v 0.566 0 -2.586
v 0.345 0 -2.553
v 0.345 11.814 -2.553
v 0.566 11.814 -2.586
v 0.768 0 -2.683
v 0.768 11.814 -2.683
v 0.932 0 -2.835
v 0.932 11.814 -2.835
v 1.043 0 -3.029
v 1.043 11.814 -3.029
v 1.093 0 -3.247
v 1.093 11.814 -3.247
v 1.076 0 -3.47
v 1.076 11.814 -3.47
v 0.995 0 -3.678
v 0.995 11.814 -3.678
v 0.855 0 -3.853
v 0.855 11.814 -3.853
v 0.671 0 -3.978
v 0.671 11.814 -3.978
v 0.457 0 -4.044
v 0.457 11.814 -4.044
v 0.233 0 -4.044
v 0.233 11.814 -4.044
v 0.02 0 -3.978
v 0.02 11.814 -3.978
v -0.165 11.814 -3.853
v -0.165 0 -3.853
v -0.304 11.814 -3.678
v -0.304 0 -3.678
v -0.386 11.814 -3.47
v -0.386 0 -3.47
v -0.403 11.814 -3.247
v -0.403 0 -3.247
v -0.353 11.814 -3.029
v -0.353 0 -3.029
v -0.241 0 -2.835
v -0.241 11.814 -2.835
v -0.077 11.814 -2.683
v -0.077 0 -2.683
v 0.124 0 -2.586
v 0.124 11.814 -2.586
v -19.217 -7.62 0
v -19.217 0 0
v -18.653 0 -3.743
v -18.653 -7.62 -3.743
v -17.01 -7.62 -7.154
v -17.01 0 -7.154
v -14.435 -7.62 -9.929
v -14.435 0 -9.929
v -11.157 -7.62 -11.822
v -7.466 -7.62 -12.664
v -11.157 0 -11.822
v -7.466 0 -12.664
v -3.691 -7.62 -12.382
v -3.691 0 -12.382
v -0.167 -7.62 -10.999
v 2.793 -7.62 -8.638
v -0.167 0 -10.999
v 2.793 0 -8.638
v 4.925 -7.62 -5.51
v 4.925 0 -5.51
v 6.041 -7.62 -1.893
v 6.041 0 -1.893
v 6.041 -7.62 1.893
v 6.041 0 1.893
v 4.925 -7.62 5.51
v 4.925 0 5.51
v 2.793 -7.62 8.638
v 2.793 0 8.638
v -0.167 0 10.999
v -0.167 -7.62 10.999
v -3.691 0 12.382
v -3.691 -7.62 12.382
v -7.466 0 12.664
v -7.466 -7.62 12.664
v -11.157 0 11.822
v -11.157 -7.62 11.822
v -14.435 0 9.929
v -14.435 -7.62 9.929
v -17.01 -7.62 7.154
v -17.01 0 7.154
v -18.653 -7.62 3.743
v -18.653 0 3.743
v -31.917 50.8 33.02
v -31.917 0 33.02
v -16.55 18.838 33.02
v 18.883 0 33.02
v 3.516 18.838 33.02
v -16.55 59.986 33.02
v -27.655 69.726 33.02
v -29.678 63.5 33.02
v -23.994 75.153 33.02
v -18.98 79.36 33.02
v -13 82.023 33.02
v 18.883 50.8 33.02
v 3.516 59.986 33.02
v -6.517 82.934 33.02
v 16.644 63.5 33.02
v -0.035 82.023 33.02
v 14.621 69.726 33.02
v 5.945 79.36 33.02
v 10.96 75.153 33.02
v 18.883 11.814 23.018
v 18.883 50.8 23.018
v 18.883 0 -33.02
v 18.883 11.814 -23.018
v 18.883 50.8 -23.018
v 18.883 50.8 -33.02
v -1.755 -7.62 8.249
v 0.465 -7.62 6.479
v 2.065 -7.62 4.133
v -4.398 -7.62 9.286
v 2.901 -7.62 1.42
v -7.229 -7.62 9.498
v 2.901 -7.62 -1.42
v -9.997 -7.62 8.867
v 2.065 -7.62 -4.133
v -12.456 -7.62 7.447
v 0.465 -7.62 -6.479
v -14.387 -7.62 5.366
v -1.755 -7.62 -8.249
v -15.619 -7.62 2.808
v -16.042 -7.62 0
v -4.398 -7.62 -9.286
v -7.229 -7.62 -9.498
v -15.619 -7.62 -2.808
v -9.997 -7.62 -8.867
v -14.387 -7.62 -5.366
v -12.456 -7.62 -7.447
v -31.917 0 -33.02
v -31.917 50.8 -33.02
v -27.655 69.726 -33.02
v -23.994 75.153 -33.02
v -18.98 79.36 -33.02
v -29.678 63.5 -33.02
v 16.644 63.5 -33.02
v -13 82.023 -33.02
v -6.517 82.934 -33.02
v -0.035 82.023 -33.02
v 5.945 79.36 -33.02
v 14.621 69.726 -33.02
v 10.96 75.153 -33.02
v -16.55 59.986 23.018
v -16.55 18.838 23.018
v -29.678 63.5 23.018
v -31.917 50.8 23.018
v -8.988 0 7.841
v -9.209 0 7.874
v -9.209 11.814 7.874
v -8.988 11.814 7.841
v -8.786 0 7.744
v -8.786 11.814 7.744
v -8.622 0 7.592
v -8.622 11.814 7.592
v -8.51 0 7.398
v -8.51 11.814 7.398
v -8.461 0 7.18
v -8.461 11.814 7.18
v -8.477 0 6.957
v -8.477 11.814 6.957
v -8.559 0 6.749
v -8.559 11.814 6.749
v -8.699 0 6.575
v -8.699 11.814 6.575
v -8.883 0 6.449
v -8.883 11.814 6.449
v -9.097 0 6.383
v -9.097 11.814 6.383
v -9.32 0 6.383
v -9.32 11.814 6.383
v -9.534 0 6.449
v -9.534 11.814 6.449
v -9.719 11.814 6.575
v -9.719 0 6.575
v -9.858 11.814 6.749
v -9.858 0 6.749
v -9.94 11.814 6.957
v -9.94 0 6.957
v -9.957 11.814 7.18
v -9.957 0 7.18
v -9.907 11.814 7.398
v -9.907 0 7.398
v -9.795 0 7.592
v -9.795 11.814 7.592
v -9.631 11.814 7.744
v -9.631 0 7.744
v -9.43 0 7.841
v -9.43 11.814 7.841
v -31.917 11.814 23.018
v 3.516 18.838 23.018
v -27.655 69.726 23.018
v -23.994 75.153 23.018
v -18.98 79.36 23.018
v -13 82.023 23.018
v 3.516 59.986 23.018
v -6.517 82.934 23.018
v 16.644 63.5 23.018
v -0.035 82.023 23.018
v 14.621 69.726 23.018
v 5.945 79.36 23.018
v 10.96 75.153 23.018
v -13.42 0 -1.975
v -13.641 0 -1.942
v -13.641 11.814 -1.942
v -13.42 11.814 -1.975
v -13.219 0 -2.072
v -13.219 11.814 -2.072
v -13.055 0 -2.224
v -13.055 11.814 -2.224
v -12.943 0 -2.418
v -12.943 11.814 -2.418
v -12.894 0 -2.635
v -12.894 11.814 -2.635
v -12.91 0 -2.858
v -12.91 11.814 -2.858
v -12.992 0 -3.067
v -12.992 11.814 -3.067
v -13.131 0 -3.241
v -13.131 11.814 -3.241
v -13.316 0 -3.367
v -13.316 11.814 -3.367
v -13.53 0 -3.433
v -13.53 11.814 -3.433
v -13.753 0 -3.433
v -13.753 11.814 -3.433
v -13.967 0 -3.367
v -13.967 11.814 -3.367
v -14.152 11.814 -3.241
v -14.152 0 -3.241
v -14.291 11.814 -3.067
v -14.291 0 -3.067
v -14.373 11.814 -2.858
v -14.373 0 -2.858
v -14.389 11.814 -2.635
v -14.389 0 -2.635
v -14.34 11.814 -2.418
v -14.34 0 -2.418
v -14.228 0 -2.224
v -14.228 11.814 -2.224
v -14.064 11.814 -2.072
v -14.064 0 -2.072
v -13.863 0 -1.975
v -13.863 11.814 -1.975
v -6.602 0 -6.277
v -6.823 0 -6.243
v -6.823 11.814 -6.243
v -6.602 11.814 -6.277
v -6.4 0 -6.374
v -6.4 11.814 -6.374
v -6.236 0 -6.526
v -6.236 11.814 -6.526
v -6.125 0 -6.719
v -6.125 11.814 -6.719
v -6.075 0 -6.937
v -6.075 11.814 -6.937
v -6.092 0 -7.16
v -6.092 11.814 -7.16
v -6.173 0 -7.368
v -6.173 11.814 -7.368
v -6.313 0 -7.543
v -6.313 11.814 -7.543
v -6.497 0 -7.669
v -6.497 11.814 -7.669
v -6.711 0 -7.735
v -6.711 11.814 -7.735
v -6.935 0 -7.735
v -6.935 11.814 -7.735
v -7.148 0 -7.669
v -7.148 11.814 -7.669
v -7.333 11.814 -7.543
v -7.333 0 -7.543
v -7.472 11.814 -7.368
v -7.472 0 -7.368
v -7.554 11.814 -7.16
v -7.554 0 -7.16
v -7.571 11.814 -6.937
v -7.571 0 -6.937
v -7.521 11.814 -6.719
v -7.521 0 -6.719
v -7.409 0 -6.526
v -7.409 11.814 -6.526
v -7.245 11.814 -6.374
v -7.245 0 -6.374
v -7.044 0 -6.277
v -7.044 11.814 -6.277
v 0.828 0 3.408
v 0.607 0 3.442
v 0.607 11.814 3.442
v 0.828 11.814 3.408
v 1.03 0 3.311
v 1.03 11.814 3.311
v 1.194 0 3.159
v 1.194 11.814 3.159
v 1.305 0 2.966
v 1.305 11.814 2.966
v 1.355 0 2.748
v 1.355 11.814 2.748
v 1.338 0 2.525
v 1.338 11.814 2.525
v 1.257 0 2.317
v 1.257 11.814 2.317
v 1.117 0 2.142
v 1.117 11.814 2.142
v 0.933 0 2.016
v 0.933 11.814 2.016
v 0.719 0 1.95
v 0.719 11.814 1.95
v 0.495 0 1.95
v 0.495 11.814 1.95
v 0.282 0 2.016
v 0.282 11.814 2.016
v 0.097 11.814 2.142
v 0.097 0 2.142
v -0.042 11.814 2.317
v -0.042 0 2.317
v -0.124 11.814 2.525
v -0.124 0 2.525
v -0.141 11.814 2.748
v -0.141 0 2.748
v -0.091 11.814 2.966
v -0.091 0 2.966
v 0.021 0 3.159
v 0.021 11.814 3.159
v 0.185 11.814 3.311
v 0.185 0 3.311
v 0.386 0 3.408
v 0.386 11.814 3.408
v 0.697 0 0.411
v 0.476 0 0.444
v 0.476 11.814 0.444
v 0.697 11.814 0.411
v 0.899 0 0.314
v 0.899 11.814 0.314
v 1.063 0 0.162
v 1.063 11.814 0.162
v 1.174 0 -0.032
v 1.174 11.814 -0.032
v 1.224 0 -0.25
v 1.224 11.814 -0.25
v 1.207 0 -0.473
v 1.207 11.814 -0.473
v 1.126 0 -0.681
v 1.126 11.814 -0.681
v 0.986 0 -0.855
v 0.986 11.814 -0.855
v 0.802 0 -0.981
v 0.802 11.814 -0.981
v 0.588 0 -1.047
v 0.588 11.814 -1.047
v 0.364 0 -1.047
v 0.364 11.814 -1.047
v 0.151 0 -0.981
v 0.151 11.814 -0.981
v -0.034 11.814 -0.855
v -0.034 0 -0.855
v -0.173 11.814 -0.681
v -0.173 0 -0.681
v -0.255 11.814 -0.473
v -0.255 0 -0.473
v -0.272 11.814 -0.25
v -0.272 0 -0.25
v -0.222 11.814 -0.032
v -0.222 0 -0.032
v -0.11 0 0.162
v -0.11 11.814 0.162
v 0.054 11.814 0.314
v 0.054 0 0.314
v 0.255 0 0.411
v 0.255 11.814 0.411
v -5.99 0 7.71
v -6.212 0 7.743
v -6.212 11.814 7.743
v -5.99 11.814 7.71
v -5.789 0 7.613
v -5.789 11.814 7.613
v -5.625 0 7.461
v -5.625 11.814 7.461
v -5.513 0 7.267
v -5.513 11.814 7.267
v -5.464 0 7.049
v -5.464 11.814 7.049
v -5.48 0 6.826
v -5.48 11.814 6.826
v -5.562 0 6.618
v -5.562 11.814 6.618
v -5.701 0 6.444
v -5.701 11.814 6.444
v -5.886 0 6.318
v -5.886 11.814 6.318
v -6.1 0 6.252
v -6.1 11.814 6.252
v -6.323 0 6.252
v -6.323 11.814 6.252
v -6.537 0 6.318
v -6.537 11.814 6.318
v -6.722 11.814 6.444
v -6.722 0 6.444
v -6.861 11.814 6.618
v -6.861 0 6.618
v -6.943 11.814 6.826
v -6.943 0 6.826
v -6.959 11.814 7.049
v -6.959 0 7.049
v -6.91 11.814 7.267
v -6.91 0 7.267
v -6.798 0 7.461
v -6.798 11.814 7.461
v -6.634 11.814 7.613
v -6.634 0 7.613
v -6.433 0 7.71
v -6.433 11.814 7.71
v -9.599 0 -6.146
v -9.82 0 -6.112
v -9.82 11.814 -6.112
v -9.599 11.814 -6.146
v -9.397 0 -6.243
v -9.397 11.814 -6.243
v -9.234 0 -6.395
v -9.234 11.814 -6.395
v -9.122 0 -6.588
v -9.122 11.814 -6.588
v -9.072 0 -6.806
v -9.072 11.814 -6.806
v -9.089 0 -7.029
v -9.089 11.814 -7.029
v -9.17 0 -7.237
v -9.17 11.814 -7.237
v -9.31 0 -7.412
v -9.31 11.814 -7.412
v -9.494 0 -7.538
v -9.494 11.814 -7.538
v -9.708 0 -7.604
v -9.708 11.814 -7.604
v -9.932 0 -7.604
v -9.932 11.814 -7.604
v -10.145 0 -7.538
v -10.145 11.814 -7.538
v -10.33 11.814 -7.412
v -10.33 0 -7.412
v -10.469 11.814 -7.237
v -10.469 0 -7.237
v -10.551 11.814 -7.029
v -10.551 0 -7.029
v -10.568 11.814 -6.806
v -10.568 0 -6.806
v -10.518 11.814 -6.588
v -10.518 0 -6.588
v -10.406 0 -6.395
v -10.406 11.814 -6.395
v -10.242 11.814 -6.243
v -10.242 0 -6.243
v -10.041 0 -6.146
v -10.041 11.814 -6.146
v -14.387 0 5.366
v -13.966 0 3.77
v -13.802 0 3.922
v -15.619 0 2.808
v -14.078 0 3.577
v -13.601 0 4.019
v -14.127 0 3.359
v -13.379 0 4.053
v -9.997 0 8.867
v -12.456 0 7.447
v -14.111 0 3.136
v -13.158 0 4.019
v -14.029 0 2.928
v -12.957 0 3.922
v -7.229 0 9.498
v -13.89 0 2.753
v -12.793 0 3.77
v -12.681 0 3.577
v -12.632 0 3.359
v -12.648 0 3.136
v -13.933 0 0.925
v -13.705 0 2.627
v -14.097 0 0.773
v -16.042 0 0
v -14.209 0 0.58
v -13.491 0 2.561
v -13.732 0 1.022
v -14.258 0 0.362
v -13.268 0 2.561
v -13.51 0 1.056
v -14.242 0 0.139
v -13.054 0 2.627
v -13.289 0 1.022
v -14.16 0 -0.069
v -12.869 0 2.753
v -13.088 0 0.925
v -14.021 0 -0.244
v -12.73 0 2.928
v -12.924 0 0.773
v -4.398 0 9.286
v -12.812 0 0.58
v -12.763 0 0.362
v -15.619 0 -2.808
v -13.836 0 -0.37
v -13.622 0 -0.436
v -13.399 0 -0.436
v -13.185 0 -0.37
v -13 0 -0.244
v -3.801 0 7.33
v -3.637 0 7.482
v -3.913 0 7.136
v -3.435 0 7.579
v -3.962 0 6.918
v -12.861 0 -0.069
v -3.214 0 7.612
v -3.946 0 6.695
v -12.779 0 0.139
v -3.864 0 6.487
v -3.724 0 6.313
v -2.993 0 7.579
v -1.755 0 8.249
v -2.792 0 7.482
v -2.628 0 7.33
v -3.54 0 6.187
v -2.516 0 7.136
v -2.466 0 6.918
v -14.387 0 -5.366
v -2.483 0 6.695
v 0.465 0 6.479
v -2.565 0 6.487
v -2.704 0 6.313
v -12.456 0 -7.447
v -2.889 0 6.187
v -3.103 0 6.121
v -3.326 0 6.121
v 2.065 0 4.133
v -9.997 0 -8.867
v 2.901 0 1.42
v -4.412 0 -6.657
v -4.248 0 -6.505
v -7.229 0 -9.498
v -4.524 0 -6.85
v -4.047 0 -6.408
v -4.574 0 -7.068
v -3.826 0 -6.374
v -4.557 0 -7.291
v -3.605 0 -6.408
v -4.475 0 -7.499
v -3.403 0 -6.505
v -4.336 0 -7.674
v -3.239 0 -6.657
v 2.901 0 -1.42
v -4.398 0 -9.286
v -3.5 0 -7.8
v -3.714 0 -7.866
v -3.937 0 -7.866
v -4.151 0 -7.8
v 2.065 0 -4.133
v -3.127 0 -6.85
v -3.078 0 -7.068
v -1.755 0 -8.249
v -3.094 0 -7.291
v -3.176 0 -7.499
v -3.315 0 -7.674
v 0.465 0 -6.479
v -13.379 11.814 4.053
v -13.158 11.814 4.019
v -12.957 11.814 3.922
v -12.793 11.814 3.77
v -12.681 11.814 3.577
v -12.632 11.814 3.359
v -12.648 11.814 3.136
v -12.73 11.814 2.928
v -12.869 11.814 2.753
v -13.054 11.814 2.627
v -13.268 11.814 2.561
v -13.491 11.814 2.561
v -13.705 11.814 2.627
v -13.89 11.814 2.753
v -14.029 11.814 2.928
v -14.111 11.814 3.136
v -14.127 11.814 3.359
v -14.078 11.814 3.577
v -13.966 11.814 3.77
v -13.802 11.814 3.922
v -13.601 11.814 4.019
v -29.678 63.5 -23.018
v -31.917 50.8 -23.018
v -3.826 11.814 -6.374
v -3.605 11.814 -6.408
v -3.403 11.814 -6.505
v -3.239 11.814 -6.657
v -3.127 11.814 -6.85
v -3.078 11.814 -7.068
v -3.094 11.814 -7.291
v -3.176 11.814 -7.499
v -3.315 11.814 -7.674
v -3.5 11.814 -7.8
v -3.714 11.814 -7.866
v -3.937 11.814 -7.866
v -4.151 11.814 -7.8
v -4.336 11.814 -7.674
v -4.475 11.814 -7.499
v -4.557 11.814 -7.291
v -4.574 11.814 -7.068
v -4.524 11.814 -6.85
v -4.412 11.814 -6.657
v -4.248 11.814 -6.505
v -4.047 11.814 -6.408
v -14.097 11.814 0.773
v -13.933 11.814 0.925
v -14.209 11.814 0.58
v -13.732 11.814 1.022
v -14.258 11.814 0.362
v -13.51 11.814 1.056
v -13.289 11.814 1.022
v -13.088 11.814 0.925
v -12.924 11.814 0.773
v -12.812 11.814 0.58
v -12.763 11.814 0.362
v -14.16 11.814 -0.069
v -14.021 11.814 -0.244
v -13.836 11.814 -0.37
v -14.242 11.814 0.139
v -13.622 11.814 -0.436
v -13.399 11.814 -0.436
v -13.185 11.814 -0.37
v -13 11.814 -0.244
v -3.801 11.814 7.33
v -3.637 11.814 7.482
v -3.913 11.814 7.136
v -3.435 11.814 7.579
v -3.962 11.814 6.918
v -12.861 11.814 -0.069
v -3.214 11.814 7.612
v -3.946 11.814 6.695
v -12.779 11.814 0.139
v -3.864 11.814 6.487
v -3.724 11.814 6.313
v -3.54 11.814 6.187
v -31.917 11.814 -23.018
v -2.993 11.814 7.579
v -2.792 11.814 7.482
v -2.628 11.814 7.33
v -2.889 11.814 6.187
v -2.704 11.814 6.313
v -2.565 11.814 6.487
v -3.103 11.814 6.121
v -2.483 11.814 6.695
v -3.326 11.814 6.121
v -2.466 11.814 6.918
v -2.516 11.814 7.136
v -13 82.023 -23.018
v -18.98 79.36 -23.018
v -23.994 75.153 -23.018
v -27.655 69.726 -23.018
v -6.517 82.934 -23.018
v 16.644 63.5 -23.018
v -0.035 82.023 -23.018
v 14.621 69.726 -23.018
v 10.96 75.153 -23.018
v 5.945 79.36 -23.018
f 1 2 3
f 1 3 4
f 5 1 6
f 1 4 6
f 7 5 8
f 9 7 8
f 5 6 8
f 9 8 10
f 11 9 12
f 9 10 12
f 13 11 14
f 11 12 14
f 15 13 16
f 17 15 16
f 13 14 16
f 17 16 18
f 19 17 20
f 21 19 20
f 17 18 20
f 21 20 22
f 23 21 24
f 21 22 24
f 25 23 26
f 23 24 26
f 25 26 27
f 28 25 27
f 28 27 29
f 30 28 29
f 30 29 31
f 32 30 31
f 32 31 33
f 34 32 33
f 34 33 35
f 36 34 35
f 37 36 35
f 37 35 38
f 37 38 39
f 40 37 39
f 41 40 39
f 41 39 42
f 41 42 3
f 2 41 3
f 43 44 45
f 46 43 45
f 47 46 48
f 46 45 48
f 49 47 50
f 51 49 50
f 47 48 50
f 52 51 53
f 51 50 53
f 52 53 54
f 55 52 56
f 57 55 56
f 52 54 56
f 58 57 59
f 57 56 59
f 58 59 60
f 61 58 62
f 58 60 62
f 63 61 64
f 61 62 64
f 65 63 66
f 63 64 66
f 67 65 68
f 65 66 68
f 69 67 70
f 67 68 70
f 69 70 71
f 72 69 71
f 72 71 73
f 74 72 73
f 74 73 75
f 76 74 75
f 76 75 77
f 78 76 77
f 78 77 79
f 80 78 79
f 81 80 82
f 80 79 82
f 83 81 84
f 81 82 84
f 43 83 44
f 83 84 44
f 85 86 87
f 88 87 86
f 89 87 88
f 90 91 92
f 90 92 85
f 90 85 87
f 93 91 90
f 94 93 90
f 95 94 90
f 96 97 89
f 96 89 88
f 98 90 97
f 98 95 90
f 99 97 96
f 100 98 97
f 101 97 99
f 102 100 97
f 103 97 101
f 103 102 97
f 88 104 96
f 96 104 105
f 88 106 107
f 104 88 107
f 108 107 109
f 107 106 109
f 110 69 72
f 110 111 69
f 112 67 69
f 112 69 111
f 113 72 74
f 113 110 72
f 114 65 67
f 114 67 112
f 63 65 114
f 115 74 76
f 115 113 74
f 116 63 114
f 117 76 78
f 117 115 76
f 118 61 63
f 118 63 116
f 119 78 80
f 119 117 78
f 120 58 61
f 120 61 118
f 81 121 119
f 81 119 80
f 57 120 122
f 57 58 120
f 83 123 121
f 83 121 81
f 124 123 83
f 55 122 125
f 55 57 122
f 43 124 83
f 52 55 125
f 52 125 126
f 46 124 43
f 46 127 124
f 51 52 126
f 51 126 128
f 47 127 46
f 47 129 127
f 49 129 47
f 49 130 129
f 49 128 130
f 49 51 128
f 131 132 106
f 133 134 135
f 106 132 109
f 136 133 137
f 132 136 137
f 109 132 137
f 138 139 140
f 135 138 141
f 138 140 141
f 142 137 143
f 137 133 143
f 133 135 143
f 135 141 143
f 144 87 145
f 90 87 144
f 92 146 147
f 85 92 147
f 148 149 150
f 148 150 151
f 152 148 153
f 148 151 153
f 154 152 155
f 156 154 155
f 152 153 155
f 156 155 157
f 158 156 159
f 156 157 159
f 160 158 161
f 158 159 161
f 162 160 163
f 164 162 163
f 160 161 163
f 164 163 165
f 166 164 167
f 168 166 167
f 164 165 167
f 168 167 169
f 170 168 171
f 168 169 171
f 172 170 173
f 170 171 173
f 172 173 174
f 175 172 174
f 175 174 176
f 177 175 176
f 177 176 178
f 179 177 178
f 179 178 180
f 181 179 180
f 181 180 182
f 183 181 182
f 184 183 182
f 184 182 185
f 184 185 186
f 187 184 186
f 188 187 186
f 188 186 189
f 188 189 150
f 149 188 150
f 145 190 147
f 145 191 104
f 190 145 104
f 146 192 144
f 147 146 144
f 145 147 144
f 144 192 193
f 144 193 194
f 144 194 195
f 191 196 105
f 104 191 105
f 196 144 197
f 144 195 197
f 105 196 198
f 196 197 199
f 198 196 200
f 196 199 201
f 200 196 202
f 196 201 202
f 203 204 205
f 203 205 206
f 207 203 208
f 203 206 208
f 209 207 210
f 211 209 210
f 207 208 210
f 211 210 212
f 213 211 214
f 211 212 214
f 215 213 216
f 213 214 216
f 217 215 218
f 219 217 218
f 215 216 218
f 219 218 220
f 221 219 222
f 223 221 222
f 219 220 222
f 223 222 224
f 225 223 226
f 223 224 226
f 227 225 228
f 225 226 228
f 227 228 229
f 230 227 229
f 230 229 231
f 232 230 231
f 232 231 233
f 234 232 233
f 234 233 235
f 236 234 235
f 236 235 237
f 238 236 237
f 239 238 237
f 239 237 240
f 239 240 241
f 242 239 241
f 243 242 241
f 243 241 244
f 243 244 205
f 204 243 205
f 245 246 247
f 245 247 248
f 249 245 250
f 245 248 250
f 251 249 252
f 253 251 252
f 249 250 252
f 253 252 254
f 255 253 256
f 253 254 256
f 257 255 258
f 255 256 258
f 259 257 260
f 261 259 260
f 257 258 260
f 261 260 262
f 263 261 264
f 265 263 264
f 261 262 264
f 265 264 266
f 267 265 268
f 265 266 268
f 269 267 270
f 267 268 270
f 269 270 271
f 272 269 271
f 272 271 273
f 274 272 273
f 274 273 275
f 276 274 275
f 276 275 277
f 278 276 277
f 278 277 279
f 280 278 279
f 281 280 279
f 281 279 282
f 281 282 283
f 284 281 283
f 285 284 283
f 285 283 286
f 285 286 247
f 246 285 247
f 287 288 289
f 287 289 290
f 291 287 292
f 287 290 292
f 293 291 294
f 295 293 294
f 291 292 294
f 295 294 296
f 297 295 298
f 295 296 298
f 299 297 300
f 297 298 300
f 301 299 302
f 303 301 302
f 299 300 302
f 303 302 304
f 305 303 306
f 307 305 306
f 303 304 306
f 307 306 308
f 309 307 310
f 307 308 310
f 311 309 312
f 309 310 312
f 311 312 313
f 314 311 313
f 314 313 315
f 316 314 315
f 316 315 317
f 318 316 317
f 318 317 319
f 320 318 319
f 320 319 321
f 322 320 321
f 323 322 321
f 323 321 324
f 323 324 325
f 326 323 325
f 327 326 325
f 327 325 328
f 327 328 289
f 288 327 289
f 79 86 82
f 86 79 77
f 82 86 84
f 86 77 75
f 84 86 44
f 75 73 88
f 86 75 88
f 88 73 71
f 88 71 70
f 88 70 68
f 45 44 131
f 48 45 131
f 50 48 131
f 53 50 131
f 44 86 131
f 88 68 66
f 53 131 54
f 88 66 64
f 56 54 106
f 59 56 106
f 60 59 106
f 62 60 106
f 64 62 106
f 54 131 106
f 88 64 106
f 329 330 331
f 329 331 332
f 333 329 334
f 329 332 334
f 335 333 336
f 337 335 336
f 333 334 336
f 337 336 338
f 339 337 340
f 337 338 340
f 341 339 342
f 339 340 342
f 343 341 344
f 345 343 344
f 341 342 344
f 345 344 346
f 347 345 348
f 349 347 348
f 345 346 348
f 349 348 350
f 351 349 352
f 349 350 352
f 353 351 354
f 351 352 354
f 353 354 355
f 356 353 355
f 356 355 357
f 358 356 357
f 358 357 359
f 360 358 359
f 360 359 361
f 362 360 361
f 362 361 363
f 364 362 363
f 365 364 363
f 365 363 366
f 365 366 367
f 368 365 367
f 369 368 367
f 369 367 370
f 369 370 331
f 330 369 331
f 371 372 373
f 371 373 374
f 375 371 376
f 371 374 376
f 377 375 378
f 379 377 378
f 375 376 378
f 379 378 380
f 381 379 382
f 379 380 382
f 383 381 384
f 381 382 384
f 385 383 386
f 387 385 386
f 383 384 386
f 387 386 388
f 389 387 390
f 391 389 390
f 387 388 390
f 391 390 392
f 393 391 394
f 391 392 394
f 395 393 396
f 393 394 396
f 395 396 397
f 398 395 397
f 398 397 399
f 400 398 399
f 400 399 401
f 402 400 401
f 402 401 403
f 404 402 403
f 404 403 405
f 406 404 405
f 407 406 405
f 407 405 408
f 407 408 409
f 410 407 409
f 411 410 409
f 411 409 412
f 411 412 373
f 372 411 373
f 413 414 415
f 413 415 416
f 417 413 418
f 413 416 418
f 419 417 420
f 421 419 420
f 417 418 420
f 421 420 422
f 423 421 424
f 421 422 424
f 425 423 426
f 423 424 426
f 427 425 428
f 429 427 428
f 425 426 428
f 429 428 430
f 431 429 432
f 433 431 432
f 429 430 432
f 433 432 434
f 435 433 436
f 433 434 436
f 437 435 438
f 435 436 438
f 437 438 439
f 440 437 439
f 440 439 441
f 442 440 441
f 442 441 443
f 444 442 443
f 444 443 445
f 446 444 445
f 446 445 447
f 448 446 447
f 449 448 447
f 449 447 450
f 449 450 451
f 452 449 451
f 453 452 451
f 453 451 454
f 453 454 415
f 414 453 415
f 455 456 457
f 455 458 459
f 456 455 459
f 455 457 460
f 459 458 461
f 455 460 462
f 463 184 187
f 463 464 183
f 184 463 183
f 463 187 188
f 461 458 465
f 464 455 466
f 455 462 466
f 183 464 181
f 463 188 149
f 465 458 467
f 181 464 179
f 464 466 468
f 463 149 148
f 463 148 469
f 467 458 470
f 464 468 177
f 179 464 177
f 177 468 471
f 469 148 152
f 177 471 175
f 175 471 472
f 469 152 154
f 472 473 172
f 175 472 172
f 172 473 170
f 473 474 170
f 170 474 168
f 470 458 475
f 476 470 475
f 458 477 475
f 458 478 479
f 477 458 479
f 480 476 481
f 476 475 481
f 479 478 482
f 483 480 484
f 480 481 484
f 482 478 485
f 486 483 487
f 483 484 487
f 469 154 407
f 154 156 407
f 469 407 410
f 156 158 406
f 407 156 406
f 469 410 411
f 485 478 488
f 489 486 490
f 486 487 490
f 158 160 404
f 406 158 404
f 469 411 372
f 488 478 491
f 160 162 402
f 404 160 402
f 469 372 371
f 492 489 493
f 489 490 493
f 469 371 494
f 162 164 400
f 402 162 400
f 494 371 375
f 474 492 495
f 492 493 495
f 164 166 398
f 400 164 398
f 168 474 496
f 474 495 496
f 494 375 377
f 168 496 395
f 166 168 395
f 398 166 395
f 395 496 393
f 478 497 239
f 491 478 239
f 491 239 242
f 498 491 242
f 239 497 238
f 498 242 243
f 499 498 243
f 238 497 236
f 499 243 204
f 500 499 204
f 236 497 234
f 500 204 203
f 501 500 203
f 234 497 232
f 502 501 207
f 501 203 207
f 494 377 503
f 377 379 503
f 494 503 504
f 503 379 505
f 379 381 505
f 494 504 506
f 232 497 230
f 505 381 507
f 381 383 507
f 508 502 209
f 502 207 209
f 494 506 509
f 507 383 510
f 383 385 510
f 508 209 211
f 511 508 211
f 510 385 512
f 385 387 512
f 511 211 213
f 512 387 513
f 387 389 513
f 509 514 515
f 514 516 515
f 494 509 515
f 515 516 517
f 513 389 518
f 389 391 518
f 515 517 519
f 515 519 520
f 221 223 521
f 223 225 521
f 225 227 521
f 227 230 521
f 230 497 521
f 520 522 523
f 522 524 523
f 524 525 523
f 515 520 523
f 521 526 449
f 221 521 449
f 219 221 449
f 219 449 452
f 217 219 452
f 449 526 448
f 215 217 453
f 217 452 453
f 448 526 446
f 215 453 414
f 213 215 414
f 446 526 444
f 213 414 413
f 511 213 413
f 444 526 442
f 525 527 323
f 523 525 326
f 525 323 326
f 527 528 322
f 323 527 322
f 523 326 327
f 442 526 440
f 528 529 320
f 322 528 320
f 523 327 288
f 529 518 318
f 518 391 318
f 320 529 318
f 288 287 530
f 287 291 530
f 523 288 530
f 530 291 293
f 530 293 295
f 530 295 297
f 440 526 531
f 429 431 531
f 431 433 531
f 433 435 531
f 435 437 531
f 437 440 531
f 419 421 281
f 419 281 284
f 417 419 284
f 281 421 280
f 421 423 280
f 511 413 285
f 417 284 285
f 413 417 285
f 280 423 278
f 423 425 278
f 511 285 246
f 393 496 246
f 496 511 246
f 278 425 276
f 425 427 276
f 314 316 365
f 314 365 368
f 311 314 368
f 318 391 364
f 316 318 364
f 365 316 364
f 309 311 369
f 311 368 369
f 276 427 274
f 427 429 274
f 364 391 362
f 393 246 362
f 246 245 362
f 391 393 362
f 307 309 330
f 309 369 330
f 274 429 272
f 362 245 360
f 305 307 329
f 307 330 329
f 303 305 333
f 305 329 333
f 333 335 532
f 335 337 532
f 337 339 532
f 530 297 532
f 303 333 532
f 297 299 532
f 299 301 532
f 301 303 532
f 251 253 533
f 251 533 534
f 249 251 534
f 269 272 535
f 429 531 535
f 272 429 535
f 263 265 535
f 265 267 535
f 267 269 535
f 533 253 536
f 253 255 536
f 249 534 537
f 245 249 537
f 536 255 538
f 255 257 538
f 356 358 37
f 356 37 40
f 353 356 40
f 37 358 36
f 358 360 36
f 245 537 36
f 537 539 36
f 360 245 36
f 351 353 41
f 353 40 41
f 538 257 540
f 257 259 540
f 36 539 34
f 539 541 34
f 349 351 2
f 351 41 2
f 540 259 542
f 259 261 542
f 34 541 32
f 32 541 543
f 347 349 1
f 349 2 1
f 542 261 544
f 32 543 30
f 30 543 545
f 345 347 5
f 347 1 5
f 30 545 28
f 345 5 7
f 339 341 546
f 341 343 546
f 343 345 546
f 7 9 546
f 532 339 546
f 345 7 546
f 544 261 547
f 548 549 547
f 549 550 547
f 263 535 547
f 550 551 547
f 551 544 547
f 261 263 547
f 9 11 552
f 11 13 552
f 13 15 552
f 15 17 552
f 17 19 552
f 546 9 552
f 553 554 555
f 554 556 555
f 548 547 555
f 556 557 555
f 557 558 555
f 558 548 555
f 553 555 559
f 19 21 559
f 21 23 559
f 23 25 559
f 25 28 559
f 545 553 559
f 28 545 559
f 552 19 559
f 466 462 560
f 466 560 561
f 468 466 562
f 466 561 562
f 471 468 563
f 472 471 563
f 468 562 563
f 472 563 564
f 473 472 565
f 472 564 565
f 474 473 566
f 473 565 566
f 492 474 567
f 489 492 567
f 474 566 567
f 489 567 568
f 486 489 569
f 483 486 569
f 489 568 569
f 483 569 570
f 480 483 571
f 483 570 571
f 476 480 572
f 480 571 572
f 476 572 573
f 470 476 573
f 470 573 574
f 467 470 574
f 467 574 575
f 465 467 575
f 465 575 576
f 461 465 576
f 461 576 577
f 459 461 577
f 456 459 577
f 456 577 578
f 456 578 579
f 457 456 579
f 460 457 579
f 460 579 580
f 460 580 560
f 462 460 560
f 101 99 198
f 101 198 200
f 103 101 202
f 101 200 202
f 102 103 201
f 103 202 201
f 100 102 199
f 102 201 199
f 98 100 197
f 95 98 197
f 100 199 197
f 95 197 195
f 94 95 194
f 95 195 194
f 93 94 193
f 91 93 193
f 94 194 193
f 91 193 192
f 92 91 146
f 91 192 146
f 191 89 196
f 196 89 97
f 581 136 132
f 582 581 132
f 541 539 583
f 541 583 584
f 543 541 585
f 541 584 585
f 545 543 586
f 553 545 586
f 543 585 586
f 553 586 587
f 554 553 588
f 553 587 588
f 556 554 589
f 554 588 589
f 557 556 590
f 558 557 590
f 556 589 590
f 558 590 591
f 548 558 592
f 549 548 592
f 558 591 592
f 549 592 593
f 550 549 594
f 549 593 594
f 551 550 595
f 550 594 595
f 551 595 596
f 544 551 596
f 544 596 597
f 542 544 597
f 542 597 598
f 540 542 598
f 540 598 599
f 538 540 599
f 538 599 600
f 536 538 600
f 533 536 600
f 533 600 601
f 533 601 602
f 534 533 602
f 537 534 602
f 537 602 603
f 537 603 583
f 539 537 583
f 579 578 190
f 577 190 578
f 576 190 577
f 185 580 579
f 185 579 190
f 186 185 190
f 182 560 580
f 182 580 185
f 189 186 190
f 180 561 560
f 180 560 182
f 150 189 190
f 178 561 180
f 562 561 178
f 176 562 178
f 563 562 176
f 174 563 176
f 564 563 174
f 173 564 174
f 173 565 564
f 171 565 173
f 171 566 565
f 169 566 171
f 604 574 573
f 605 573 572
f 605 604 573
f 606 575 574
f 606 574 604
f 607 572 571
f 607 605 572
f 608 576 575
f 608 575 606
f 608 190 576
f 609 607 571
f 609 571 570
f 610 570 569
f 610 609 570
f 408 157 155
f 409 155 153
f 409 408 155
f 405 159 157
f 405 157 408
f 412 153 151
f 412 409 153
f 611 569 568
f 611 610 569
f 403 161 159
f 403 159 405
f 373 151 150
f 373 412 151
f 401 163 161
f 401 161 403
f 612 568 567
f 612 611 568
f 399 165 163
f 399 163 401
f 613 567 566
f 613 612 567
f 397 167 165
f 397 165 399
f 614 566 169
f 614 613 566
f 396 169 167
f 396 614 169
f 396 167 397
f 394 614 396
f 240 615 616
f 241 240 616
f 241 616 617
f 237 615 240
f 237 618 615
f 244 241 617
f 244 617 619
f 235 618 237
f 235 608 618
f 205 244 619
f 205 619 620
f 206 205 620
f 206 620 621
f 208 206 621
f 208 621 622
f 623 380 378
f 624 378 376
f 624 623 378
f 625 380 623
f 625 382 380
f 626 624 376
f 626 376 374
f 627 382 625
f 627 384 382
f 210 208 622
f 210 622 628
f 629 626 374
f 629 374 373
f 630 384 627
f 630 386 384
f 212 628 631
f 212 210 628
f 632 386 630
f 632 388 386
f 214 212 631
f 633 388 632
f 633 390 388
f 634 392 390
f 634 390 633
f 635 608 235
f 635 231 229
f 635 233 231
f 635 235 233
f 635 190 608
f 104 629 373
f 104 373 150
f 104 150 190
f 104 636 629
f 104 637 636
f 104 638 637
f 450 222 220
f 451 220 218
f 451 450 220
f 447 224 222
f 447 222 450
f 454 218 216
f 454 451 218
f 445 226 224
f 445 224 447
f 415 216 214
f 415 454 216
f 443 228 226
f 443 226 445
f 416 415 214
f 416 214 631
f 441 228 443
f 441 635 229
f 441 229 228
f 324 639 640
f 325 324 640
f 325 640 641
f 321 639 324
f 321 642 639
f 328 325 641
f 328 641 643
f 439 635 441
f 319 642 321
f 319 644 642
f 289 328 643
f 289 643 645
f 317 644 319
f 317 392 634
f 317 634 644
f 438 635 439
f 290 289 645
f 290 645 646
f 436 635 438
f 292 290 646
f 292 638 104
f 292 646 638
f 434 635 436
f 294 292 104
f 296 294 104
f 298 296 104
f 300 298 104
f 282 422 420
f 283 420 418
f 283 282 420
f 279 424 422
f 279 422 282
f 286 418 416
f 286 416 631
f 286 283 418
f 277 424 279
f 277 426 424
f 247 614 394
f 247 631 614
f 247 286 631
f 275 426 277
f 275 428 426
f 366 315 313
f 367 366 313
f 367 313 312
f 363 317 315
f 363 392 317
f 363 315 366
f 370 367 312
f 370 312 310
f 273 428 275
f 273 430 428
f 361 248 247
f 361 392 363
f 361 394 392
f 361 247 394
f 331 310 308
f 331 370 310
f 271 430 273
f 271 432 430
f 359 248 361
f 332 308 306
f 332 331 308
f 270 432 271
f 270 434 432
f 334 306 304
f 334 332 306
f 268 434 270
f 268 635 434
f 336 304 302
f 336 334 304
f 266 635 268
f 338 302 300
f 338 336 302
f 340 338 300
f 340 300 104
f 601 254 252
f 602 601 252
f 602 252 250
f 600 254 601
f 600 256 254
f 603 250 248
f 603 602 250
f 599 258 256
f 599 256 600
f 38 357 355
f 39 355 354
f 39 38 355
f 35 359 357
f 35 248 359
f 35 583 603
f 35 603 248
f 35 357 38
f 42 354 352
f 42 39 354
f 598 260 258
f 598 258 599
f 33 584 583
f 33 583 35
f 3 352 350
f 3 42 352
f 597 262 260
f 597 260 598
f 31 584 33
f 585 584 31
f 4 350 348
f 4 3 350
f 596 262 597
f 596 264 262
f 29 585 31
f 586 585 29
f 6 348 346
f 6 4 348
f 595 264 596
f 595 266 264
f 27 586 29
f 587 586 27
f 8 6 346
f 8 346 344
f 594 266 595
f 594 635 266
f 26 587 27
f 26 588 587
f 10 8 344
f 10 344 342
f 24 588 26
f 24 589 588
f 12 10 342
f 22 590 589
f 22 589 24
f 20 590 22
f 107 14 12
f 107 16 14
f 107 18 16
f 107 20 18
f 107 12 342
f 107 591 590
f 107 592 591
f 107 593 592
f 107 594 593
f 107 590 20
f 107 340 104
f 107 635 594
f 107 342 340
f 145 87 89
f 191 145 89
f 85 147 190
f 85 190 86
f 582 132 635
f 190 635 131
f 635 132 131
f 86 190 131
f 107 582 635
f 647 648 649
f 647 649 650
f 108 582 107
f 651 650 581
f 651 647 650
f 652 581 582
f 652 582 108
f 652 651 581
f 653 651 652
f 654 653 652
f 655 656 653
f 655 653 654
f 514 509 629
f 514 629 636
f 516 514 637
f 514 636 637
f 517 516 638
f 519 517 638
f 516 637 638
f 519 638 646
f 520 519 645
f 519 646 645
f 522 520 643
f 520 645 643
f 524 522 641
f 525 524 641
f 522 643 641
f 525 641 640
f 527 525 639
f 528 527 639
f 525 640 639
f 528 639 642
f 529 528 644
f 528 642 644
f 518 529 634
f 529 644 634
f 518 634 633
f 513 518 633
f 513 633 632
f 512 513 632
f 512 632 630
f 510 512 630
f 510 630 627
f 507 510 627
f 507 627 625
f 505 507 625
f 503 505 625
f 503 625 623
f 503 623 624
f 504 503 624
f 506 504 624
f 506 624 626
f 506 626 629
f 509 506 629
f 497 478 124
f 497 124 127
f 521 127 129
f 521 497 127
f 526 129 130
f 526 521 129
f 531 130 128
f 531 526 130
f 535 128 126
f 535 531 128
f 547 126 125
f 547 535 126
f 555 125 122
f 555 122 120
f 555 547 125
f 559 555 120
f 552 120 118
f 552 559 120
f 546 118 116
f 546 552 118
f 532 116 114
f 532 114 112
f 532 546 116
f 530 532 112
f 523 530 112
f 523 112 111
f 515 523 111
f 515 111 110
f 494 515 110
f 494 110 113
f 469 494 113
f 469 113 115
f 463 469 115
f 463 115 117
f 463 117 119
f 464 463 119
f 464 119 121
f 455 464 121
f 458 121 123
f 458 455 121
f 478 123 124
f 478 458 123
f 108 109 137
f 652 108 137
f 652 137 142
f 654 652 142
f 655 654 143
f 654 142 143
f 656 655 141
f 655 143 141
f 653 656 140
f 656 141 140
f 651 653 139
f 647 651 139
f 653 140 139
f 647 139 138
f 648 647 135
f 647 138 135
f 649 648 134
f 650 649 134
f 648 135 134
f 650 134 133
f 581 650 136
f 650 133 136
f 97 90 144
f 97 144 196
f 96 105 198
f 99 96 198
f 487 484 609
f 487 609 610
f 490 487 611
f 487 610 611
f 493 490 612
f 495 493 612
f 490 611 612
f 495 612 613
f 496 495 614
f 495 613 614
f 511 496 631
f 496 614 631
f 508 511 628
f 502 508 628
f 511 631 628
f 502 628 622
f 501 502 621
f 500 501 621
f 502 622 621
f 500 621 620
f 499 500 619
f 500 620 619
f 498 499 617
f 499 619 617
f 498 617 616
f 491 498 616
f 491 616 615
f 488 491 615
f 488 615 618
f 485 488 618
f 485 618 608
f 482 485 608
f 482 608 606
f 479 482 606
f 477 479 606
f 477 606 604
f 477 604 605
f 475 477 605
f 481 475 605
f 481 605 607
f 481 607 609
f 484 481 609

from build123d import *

# Parameters (mm, degrees)
BOSS_EXTRUDE2_DEPTH      = 33.02
BOSS_EXTRUDE2_DEPTH_BACK = 33.02
SKETCH5_W                = 50.93744157
SKETCH5_H                = 46.03648482
CUT_EXTRUDE2_DEPTH       = 71.12
SKETCH9_R                = 12.7
SKETCH9_R_2              = 9.525
BOSS_EXTRUDE3_DEPTH      = 7.62
CUT_EXTRUDE3_REACH       = 86.659
SKETCH10_R               = 0.75
CUT_EXTRUDE4_REACH       = 112.716
SKETCH11_W               = 20.066
SKETCH11_H               = 41.148


with BuildPart() as part:
    # Sketch3 → Boss-Extrude2 (new, two sides: drawn at the far end of the back side and taken through both)
    with BuildSketch(Plane.XY.offset(-BOSS_EXTRUDE2_DEPTH_BACK)):
        with BuildLine():
            Line((-31.917133282, 0), (18.882866718, 0))
            Line((18.882866718, 0), (18.882866718, 50.8))
            Line((18.882866718, 50.8), (16.643514063, 63.5))
            ThreePointArc((16.643514063, 63.5), (-6.517133282, 82.934090645), (-29.677780627, 63.5))
            Line((-29.677780627, 63.5), (-31.917133282, 50.8))
            Line((-31.917133282, 50.8), (-31.917133282, 0))
        make_face()
    extrude(amount=BOSS_EXTRUDE2_DEPTH + BOSS_EXTRUDE2_DEPTH_BACK)

    # Sketch5 → Cut-Extrude2 (cut)
    with BuildSketch(Plane(origin=(0, 82.934090645, 0), x_dir=(1, 0, 0), z_dir=(0, 1, 0))):
        with Locations((-6.517133282, 0)):
            Rectangle(SKETCH5_W, SKETCH5_H)
    extrude(amount=-CUT_EXTRUDE2_DEPTH, mode=Mode.SUBTRACT)

    # Sketch9 → Boss-Extrude3 (add)
    with BuildSketch(Plane.XZ):
        with Locations((-6.517133282, 0)):
            Circle(SKETCH9_R)
        with Locations((-6.517133282, 0)):
            Circle(SKETCH9_R_2, mode=Mode.SUBTRACT)
    extrude(amount=BOSS_EXTRUDE3_DEPTH)

    # Sketch10 → Cut-Extrude3 (cut, up to next)
    with BuildSketch(Plane(origin=(0, 11.814090645, 0), x_dir=(1, 0, 0), z_dir=(0, 1, 0)), mode=Mode.PRIVATE) as cut_extrude3_sk1:
        with Locations((-3.214362801, -6.862339772)):
            Circle(SKETCH10_R)
    cut_extrude3_tool1 = extrude(cut_extrude3_sk1.sketch, amount=-CUT_EXTRUDE3_REACH, mode=Mode.PRIVATE) & part.part
    # Sketch10 → Cut-Extrude3 (cut, up to next)
    with BuildSketch(Plane(origin=(0, 11.814090645, 0), x_dir=(1, 0, 0), z_dir=(0, 1, 0)), mode=Mode.PRIVATE) as cut_extrude3_sk2:
        with Locations((-6.211501931, -6.993324637)):
            Circle(SKETCH10_R)
    cut_extrude3_tool2 = extrude(cut_extrude3_sk2.sketch, amount=-CUT_EXTRUDE3_REACH, mode=Mode.PRIVATE) & part.part
    # Sketch10 → Cut-Extrude3 (cut, up to next)
    with BuildSketch(Plane(origin=(0, 11.814090645, 0), x_dir=(1, 0, 0), z_dir=(0, 1, 0)), mode=Mode.PRIVATE) as cut_extrude3_sk3:
        with Locations((-9.208641061, -7.124309502)):
            Circle(SKETCH10_R)
    cut_extrude3_tool3 = extrude(cut_extrude3_sk3.sketch, amount=-CUT_EXTRUDE3_REACH, mode=Mode.PRIVATE) & part.part
    # Sketch10 → Cut-Extrude3 (cut, up to next)
    with BuildSketch(Plane(origin=(0, 11.814090645, 0), x_dir=(1, 0, 0), z_dir=(0, 1, 0)), mode=Mode.PRIVATE) as cut_extrude3_sk4:
        with Locations((-13.379473054, -3.302770481)):
            Circle(SKETCH10_R)
    cut_extrude3_tool4 = extrude(cut_extrude3_sk4.sketch, amount=-CUT_EXTRUDE3_REACH, mode=Mode.PRIVATE) & part.part
    # Sketch10 → Cut-Extrude3 (cut, up to next)
    with BuildSketch(Plane(origin=(0, 11.814090645, 0), x_dir=(1, 0, 0), z_dir=(0, 1, 0)), mode=Mode.PRIVATE) as cut_extrude3_sk5:
        with Locations((-13.510457919, -0.305631351)):
            Circle(SKETCH10_R)
    cut_extrude3_tool5 = extrude(cut_extrude3_sk5.sketch, amount=-CUT_EXTRUDE3_REACH, mode=Mode.PRIVATE) & part.part
    # Sketch10 → Cut-Extrude3 (cut, up to next)
    with BuildSketch(Plane(origin=(0, 11.814090645, 0), x_dir=(1, 0, 0), z_dir=(0, 1, 0)), mode=Mode.PRIVATE) as cut_extrude3_sk6:
        with Locations((-13.641442784, 2.691507779)):
            Circle(SKETCH10_R)
    cut_extrude3_tool6 = extrude(cut_extrude3_sk6.sketch, amount=-CUT_EXTRUDE3_REACH, mode=Mode.PRIVATE) & part.part
    # Sketch10 → Cut-Extrude3 (cut, up to next)
    with BuildSketch(Plane(origin=(0, 11.814090645, 0), x_dir=(1, 0, 0), z_dir=(0, 1, 0)), mode=Mode.PRIVATE) as cut_extrude3_sk7:
        with Locations((0.60717622, -2.691507779)):
            Circle(SKETCH10_R)
    cut_extrude3_tool7 = extrude(cut_extrude3_sk7.sketch, amount=-CUT_EXTRUDE3_REACH, mode=Mode.PRIVATE) & part.part
    # Sketch10 → Cut-Extrude3 (cut, up to next)
    with BuildSketch(Plane(origin=(0, 11.814090645, 0), x_dir=(1, 0, 0), z_dir=(0, 1, 0)), mode=Mode.PRIVATE) as cut_extrude3_sk8:
        with Locations((0.476191355, 0.305631351)):
            Circle(SKETCH10_R)
    cut_extrude3_tool8 = extrude(cut_extrude3_sk8.sketch, amount=-CUT_EXTRUDE3_REACH, mode=Mode.PRIVATE) & part.part
    # Sketch10 → Cut-Extrude3 (cut, up to next)
    with BuildSketch(Plane(origin=(0, 11.814090645, 0), x_dir=(1, 0, 0), z_dir=(0, 1, 0)), mode=Mode.PRIVATE) as cut_extrude3_sk9:
        with Locations((0.34520649, 3.302770481)):
            Circle(SKETCH10_R)
    cut_extrude3_tool9 = extrude(cut_extrude3_sk9.sketch, amount=-CUT_EXTRUDE3_REACH, mode=Mode.PRIVATE) & part.part
    # Sketch10 → Cut-Extrude3 (cut, up to next)
    with BuildSketch(Plane(origin=(0, 11.814090645, 0), x_dir=(1, 0, 0), z_dir=(0, 1, 0)), mode=Mode.PRIVATE) as cut_extrude3_sk10:
        with Locations((-3.825625503, 7.124309502)):
            Circle(SKETCH10_R)
    cut_extrude3_tool10 = extrude(cut_extrude3_sk10.sketch, amount=-CUT_EXTRUDE3_REACH, mode=Mode.PRIVATE) & part.part
    # Sketch10 → Cut-Extrude3 (cut, up to next)
    with BuildSketch(Plane(origin=(0, 11.814090645, 0), x_dir=(1, 0, 0), z_dir=(0, 1, 0)), mode=Mode.PRIVATE) as cut_extrude3_sk11:
        with Locations((-6.822764633, 6.993324637)):
            Circle(SKETCH10_R)
    cut_extrude3_tool11 = extrude(cut_extrude3_sk11.sketch, amount=-CUT_EXTRUDE3_REACH, mode=Mode.PRIVATE) & part.part
    # Sketch10 → Cut-Extrude3 (cut, up to next)
    with BuildSketch(Plane(origin=(0, 11.814090645, 0), x_dir=(1, 0, 0), z_dir=(0, 1, 0)), mode=Mode.PRIVATE) as cut_extrude3_sk12:
        with Locations((-9.819903763, 6.862339772)):
            Circle(SKETCH10_R)
    cut_extrude3_tool12 = extrude(cut_extrude3_sk12.sketch, amount=-CUT_EXTRUDE3_REACH, mode=Mode.PRIVATE) & part.part
    add(cut_extrude3_tool1.solids().sort_by_distance((-3.214363, 11.814091, 6.86234))[0], mode=Mode.SUBTRACT)
    add(cut_extrude3_tool2.solids().sort_by_distance((-6.211502, 11.814091, 6.993325))[0], mode=Mode.SUBTRACT)
    add(cut_extrude3_tool3.solids().sort_by_distance((-9.208641, 11.814091, 7.12431))[0], mode=Mode.SUBTRACT)
    add(cut_extrude3_tool4.solids().sort_by_distance((-13.379473, 11.814091, 3.30277))[0], mode=Mode.SUBTRACT)
    add(cut_extrude3_tool5.solids().sort_by_distance((-13.510458, 11.814091, 0.305631))[0], mode=Mode.SUBTRACT)
    add(cut_extrude3_tool6.solids().sort_by_distance((-13.641443, 11.814091, -2.691508))[0], mode=Mode.SUBTRACT)
    add(cut_extrude3_tool7.solids().sort_by_distance((0.607176, 11.814091, 2.691508))[0], mode=Mode.SUBTRACT)
    add(cut_extrude3_tool8.solids().sort_by_distance((0.476191, 11.814091, -0.305631))[0], mode=Mode.SUBTRACT)
    add(cut_extrude3_tool9.solids().sort_by_distance((0.345206, 11.814091, -3.30277))[0], mode=Mode.SUBTRACT)
    add(cut_extrude3_tool10.solids().sort_by_distance((-3.825626, 11.814091, -7.12431))[0], mode=Mode.SUBTRACT)
    add(cut_extrude3_tool11.solids().sort_by_distance((-6.822765, 11.814091, -6.993325))[0], mode=Mode.SUBTRACT)
    add(cut_extrude3_tool12.solids().sort_by_distance((-9.819904, 11.814091, -6.86234))[0], mode=Mode.SUBTRACT)

    # Sketch11 → Cut-Extrude4 (cut, up to next)
    with BuildSketch(Plane.XY.offset(33.02), mode=Mode.PRIVATE) as cut_extrude4_sk1:
        with Locations((-6.517133282, 39.412411)):
            Rectangle(SKETCH11_W, SKETCH11_H)
    cut_extrude4_tool1 = extrude(cut_extrude4_sk1.sketch, amount=-CUT_EXTRUDE4_REACH, mode=Mode.PRIVATE) & part.part
    add(cut_extrude4_tool1.solids().sort_by_distance((-6.517133, 39.412411, 33.02))[0], mode=Mode.SUBTRACT)


solid = part.part
